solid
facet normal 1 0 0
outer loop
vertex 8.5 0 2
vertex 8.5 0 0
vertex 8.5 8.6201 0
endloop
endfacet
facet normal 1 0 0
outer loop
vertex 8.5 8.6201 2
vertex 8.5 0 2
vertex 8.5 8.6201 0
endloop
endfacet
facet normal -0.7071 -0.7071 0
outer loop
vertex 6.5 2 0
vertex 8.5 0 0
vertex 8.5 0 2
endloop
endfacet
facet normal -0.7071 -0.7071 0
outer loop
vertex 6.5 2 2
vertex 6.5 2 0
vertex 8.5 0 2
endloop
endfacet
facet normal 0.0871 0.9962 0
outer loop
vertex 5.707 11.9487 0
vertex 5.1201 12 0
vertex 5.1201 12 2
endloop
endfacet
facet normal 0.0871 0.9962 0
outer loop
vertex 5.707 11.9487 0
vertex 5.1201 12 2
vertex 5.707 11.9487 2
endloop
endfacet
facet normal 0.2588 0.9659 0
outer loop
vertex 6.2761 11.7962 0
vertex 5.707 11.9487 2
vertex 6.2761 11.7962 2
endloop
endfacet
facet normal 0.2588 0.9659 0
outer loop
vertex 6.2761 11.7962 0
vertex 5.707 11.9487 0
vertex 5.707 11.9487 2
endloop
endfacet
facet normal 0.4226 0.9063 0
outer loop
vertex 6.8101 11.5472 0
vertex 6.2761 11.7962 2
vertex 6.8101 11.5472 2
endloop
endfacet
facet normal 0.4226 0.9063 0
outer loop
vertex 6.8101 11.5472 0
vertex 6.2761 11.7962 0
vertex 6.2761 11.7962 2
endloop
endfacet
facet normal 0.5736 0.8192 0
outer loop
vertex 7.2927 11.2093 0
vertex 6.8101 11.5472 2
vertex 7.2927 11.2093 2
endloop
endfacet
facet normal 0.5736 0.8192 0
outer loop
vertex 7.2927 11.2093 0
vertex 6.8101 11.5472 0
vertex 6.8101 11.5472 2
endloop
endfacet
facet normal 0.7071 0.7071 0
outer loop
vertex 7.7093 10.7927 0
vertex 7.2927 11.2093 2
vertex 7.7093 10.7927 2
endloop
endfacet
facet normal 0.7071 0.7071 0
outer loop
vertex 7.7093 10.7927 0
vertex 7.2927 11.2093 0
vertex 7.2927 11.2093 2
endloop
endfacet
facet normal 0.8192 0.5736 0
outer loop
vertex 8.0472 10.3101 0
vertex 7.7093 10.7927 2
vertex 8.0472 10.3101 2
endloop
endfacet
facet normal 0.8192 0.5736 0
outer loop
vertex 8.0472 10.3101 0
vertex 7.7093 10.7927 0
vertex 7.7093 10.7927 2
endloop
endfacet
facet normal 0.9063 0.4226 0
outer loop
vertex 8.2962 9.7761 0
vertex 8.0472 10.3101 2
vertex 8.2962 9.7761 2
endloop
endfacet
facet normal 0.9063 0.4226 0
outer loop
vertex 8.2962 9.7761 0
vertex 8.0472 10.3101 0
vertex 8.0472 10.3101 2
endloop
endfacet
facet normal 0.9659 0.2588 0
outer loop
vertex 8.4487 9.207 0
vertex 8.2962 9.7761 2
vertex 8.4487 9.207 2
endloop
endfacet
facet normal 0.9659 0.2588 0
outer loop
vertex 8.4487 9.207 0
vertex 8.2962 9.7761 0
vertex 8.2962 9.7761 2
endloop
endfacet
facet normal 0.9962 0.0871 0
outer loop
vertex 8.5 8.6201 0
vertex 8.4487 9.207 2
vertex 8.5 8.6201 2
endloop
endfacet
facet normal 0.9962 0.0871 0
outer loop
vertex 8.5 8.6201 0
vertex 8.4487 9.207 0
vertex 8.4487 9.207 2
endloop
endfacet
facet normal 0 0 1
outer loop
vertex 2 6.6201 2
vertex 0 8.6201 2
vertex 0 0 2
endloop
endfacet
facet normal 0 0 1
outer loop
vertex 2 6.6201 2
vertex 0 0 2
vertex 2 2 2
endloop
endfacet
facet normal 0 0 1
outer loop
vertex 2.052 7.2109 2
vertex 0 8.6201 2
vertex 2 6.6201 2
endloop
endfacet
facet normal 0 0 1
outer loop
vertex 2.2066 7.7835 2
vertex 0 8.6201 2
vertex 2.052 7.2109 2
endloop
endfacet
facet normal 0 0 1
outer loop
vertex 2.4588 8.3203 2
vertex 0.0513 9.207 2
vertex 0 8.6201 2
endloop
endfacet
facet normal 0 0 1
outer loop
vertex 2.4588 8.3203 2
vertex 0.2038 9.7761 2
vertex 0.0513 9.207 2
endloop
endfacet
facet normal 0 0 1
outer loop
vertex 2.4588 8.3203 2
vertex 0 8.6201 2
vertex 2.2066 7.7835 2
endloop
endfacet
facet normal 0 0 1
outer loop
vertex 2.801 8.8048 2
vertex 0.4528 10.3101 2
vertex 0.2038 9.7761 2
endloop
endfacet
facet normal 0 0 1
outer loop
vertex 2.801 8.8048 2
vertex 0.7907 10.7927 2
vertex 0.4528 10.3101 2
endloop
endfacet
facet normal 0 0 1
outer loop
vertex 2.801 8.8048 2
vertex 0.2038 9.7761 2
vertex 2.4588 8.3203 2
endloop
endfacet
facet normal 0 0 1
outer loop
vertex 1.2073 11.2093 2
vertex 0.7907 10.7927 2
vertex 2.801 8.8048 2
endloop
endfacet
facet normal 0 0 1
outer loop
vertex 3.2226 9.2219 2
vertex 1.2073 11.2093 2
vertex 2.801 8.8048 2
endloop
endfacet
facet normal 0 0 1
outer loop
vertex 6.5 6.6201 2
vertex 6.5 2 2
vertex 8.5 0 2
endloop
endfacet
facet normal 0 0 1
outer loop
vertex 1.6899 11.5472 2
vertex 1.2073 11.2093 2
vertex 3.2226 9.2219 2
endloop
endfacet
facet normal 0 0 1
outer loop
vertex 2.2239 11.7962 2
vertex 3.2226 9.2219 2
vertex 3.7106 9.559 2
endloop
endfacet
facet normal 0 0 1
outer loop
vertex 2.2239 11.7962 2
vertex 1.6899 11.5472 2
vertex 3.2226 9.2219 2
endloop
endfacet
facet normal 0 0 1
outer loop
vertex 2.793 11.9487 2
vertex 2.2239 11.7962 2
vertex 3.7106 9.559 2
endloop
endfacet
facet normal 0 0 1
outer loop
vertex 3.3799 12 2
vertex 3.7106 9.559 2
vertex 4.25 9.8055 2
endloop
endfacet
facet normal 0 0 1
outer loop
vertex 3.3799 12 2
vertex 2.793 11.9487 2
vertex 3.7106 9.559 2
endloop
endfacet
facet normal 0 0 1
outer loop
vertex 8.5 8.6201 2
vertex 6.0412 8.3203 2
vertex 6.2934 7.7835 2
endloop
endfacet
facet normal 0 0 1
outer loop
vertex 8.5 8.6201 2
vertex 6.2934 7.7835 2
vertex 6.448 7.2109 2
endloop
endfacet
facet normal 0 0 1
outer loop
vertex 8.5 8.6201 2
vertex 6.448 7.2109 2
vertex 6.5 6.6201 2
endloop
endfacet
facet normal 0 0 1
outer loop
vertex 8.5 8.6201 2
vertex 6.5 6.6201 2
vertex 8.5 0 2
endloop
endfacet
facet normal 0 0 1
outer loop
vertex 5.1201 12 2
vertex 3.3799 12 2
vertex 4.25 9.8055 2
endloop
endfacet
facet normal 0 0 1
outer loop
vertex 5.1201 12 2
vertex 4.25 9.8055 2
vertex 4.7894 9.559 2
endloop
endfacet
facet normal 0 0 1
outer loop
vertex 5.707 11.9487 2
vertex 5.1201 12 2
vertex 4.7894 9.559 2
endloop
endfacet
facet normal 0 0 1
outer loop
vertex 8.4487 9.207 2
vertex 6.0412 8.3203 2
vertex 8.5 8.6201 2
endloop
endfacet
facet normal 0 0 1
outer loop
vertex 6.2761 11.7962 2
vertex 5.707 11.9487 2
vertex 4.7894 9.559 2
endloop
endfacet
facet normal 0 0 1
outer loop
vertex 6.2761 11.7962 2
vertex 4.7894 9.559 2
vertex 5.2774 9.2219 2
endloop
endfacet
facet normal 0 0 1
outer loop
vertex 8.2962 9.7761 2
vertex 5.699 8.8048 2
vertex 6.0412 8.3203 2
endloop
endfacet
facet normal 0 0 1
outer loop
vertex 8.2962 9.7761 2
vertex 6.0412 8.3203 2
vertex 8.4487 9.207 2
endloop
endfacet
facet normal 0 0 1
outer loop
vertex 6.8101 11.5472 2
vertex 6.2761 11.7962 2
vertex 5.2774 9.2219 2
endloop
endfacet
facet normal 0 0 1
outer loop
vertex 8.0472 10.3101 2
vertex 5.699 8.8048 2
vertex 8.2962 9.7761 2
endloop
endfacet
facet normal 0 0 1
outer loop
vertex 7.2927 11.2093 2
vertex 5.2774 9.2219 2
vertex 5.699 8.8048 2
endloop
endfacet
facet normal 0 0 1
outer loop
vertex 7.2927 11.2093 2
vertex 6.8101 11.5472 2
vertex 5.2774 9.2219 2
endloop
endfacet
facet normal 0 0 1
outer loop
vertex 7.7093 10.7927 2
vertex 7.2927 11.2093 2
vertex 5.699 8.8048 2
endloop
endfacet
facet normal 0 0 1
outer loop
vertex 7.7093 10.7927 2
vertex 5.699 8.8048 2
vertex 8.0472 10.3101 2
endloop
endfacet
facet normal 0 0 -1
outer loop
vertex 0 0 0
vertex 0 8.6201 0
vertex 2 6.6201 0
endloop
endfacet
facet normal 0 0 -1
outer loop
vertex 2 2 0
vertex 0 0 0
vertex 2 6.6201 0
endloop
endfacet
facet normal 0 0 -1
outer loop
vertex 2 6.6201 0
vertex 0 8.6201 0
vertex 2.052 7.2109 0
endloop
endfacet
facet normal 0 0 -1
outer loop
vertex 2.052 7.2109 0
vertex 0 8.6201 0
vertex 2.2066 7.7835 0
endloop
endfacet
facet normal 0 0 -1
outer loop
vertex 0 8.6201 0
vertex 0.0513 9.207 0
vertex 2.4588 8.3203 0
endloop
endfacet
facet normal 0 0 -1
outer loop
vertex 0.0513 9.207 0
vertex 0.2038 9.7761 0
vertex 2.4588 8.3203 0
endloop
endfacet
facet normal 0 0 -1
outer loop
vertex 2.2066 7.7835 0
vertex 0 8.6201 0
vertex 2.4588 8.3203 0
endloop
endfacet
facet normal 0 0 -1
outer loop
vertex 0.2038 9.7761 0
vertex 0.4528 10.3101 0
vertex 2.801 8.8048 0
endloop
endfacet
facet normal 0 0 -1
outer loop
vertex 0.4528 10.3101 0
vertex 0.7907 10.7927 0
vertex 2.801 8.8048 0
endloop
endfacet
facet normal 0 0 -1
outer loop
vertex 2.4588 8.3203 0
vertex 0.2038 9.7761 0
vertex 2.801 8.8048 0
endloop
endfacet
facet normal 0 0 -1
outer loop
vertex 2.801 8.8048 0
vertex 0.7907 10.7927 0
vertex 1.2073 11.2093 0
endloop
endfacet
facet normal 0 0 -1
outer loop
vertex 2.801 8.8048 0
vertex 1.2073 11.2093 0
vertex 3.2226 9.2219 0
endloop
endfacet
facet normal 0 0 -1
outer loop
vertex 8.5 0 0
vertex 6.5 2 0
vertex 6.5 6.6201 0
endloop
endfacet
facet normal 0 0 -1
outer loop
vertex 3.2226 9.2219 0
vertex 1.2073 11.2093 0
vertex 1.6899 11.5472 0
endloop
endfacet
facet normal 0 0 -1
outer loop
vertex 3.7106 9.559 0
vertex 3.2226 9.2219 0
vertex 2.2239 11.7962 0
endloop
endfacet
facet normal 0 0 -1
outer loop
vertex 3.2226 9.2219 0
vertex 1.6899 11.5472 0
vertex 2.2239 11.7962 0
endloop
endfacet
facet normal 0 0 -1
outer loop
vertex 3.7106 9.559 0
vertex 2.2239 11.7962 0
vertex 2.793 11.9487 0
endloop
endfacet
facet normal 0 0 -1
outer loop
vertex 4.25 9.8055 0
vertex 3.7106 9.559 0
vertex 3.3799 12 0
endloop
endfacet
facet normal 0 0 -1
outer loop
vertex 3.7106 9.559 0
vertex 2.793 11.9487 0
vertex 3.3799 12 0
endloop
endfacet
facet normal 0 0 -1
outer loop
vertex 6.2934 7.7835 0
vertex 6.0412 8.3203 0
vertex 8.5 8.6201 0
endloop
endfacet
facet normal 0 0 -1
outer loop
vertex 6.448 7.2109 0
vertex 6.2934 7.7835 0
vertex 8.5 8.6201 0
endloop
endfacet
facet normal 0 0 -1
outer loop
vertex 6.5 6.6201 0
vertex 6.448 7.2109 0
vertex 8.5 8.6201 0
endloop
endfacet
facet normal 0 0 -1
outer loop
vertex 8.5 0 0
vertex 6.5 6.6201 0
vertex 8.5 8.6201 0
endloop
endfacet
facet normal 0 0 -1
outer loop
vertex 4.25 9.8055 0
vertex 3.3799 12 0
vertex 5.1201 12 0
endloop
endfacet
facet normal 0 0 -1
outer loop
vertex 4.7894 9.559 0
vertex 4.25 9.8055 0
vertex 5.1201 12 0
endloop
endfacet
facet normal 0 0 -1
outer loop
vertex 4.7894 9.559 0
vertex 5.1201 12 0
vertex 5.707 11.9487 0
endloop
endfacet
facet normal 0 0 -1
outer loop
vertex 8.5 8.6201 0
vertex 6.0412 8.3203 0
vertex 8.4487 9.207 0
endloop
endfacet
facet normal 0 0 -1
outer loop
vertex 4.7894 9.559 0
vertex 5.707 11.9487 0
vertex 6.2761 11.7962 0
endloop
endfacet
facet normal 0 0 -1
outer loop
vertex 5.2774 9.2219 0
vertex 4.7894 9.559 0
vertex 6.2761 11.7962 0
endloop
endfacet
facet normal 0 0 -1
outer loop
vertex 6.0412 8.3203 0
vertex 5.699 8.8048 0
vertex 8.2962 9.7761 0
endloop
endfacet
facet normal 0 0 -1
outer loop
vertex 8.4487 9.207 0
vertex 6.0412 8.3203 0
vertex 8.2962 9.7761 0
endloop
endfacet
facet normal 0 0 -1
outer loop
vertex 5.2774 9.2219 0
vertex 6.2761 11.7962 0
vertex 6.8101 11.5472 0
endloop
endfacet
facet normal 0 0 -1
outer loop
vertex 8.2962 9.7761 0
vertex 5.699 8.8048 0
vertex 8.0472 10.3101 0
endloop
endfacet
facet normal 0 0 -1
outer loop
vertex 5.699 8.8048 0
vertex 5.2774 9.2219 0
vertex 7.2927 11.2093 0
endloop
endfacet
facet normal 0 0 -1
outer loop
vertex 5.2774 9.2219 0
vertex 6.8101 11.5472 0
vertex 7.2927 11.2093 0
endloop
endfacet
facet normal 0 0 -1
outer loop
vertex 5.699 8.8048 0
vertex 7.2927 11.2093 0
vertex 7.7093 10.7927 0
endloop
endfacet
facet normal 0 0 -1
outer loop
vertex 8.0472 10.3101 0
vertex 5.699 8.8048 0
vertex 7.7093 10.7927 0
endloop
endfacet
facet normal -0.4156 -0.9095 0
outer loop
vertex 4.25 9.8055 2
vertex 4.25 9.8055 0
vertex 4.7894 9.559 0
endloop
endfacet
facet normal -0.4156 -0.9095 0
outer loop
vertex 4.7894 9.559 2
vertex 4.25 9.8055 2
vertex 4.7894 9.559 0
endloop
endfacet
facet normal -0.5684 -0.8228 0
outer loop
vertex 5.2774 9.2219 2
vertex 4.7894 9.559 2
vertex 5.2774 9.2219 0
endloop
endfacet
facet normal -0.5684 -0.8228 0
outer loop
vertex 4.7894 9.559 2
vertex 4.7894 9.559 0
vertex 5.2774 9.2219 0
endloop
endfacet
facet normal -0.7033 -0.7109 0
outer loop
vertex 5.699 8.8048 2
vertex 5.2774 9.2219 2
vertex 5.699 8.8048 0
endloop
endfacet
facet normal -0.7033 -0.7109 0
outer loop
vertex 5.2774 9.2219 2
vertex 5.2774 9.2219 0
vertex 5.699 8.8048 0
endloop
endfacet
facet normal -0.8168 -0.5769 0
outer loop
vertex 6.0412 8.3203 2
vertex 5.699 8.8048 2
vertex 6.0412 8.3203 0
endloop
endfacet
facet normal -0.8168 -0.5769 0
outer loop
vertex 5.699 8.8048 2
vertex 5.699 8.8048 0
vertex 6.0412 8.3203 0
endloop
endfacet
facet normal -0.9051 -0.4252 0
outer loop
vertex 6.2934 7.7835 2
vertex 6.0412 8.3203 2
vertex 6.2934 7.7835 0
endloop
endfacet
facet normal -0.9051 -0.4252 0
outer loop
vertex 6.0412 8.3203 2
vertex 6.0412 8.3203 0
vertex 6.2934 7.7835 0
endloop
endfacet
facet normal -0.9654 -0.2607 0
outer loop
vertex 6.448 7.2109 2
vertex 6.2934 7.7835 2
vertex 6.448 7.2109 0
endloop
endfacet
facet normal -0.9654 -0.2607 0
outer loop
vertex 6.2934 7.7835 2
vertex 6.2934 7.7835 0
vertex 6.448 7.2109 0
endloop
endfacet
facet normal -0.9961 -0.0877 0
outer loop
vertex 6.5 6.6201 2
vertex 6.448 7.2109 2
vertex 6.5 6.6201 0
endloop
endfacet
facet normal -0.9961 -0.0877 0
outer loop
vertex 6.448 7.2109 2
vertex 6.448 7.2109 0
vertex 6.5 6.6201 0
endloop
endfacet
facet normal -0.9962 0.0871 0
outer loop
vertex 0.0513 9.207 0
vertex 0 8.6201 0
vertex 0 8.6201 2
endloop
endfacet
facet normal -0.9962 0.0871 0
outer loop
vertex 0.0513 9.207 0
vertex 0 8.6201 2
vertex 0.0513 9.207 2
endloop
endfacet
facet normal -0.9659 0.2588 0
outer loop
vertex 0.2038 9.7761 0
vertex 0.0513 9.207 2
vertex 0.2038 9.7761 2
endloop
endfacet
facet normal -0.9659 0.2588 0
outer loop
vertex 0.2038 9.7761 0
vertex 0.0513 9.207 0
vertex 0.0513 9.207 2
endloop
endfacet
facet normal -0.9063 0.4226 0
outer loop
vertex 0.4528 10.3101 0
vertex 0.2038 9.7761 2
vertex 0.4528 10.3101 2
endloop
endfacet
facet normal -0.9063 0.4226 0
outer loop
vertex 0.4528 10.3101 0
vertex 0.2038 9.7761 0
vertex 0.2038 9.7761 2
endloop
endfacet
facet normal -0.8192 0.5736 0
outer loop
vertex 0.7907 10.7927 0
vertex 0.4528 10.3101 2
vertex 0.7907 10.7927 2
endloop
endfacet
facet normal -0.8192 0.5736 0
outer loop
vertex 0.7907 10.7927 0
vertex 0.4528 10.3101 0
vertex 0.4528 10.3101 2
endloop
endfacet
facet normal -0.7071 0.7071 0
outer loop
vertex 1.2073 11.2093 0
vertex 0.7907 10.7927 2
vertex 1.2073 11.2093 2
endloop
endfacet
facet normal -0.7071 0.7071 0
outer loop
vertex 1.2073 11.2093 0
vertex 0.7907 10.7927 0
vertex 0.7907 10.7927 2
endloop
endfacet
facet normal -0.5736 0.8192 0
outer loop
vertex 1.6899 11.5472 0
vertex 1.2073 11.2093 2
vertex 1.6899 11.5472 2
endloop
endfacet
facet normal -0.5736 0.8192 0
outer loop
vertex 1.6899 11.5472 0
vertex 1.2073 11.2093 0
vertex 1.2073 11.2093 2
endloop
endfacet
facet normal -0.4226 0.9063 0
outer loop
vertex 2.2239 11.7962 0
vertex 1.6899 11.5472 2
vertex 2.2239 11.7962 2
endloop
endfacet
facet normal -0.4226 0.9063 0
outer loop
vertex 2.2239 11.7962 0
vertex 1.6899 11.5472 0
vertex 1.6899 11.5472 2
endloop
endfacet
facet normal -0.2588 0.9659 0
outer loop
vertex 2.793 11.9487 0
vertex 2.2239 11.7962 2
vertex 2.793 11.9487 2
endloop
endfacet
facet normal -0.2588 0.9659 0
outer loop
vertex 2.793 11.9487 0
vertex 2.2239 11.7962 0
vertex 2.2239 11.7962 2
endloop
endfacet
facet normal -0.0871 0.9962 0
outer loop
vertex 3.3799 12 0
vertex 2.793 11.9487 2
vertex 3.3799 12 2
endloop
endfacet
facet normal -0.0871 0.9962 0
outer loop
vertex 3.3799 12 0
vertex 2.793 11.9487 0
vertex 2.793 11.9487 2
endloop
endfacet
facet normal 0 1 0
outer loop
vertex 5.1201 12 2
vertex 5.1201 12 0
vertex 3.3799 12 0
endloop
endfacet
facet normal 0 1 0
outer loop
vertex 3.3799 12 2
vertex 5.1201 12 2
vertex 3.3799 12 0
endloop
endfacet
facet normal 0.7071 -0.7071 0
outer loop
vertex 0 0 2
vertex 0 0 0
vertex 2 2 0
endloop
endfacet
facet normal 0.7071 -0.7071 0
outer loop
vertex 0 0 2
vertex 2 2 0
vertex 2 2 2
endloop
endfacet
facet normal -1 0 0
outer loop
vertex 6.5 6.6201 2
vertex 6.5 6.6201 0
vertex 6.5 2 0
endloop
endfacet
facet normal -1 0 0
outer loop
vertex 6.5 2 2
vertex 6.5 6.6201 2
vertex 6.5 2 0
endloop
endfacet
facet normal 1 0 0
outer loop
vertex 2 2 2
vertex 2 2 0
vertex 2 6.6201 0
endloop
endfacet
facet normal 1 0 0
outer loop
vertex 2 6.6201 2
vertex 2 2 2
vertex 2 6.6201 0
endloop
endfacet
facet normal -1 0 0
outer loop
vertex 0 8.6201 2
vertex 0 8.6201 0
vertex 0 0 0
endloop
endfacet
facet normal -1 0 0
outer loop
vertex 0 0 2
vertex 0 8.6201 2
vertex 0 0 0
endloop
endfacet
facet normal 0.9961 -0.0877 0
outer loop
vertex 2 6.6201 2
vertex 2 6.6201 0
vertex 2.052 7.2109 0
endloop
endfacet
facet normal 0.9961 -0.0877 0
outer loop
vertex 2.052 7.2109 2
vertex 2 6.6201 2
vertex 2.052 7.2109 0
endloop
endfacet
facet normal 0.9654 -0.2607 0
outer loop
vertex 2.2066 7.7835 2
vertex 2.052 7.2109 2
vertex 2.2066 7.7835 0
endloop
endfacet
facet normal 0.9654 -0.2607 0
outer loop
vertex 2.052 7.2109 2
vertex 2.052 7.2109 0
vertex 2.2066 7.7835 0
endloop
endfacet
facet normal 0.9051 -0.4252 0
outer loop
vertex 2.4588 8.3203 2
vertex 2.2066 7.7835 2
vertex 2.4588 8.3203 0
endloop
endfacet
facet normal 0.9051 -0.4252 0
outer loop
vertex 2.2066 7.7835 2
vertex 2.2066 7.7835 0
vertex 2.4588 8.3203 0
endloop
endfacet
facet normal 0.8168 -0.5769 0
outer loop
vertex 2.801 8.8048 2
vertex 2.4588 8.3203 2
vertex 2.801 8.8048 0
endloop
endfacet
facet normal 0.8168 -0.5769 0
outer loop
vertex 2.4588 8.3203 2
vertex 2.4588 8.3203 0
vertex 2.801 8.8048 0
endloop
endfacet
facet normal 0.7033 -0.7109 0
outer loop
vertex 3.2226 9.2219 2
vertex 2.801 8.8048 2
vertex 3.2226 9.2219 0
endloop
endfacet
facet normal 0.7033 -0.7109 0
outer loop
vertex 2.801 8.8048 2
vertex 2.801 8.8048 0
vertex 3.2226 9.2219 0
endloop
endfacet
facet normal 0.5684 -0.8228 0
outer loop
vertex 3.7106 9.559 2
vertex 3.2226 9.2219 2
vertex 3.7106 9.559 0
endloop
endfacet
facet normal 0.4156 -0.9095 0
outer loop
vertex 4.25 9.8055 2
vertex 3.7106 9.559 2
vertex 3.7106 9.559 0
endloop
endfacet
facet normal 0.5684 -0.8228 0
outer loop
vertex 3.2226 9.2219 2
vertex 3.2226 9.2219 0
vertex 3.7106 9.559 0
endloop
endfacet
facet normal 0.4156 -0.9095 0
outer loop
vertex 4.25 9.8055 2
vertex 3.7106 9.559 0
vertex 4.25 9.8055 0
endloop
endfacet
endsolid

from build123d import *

# Parameters (mm, degrees)
F0_W        = 4.5
F0_H        = 2
F1_DEPTH    = 2
F2_T1_DEPTH = 2
F2_T3_DEPTH = 18.8994949366
F3_SIZE     = 1.99999


# Not quite as in the source:
# - a fillet or chamfer that OpenCascade refuses, or shapes differently, is made with other operations: its cross-section is extruded or revolved along the edge and cut away or added
# - a fillet or chamfer is up to 0.001 mm smaller than in the source, because OpenCascade refuses the exact size


with BuildPart() as f1:
    # F0 (on Top) → F1 (new body)
    with BuildSketch(Plane.XY):
        Polygon((0, 12), (0, 0), (2, 0), (2, 10), (2, 12), align=None)
        Polygon((6.5, 12), (6.5, 10), (6.5, 0), (8.5, 0), (8.5, 12), align=None)
        with Locations((4.25, 11)):
            Rectangle(F0_W, F0_H)
    extrude(amount=F1_DEPTH)

    # F2: fillet of radius 3.3798989873 on 4 edges, made by hand

    # F2_s2 → F2_t1 (join)
    with BuildSketch(Plane.XY):
        with BuildLine():
            ThreePointArc((3.1201010127, 10), (5.5100505063, 9.0100505063), (6.5, 6.6201010127))
            Line((6.5, 6.6201010127), (6.5, 10))
            Line((6.5, 10), (3.1201010127, 10))
        make_face()
        with BuildLine():
            ThreePointArc((2, 6.6201010127), (2.9899494937, 9.0100505063), (5.3798989873, 10))
            Line((5.3798989873, 10), (2, 10))
            Line((2, 10), (2, 6.6201010127))
        make_face()
    extrude(amount=F2_T1_DEPTH)

    # F2_s4 → F2_t3 (cut)
    with BuildSketch(Plane.XY.offset(-8.4497474683)):
        with BuildLine():
            ThreePointArc((0, 8.6201010127), (0.9899494937, 11.0100505063), (3.3798989873, 12))
            Line((3.3798989873, 12), (0, 12))
            Line((0, 12), (0, 8.6201010127))
        make_face()
        with BuildLine():
            ThreePointArc((5.1201010127, 12), (7.5100505063, 11.0100505063), (8.5, 8.6201010127))
            Line((8.5, 8.6201010127), (8.5, 12))
            Line((8.5, 12), (5.1201010127, 12))
        make_face()
    extrude(amount=F2_T3_DEPTH, mode=Mode.SUBTRACT)

    # F3 (size 2 in the source; OpenCascade refuses exactly that, so slightly less here)
    f3_edges = [f1.edges().sort_by_distance(p)[0] for p in [
        (2, 0, 1),
        (6.5, 0, 1),
    ]]
    chamfer(f3_edges, length=F3_SIZE)


solid = f1.part
